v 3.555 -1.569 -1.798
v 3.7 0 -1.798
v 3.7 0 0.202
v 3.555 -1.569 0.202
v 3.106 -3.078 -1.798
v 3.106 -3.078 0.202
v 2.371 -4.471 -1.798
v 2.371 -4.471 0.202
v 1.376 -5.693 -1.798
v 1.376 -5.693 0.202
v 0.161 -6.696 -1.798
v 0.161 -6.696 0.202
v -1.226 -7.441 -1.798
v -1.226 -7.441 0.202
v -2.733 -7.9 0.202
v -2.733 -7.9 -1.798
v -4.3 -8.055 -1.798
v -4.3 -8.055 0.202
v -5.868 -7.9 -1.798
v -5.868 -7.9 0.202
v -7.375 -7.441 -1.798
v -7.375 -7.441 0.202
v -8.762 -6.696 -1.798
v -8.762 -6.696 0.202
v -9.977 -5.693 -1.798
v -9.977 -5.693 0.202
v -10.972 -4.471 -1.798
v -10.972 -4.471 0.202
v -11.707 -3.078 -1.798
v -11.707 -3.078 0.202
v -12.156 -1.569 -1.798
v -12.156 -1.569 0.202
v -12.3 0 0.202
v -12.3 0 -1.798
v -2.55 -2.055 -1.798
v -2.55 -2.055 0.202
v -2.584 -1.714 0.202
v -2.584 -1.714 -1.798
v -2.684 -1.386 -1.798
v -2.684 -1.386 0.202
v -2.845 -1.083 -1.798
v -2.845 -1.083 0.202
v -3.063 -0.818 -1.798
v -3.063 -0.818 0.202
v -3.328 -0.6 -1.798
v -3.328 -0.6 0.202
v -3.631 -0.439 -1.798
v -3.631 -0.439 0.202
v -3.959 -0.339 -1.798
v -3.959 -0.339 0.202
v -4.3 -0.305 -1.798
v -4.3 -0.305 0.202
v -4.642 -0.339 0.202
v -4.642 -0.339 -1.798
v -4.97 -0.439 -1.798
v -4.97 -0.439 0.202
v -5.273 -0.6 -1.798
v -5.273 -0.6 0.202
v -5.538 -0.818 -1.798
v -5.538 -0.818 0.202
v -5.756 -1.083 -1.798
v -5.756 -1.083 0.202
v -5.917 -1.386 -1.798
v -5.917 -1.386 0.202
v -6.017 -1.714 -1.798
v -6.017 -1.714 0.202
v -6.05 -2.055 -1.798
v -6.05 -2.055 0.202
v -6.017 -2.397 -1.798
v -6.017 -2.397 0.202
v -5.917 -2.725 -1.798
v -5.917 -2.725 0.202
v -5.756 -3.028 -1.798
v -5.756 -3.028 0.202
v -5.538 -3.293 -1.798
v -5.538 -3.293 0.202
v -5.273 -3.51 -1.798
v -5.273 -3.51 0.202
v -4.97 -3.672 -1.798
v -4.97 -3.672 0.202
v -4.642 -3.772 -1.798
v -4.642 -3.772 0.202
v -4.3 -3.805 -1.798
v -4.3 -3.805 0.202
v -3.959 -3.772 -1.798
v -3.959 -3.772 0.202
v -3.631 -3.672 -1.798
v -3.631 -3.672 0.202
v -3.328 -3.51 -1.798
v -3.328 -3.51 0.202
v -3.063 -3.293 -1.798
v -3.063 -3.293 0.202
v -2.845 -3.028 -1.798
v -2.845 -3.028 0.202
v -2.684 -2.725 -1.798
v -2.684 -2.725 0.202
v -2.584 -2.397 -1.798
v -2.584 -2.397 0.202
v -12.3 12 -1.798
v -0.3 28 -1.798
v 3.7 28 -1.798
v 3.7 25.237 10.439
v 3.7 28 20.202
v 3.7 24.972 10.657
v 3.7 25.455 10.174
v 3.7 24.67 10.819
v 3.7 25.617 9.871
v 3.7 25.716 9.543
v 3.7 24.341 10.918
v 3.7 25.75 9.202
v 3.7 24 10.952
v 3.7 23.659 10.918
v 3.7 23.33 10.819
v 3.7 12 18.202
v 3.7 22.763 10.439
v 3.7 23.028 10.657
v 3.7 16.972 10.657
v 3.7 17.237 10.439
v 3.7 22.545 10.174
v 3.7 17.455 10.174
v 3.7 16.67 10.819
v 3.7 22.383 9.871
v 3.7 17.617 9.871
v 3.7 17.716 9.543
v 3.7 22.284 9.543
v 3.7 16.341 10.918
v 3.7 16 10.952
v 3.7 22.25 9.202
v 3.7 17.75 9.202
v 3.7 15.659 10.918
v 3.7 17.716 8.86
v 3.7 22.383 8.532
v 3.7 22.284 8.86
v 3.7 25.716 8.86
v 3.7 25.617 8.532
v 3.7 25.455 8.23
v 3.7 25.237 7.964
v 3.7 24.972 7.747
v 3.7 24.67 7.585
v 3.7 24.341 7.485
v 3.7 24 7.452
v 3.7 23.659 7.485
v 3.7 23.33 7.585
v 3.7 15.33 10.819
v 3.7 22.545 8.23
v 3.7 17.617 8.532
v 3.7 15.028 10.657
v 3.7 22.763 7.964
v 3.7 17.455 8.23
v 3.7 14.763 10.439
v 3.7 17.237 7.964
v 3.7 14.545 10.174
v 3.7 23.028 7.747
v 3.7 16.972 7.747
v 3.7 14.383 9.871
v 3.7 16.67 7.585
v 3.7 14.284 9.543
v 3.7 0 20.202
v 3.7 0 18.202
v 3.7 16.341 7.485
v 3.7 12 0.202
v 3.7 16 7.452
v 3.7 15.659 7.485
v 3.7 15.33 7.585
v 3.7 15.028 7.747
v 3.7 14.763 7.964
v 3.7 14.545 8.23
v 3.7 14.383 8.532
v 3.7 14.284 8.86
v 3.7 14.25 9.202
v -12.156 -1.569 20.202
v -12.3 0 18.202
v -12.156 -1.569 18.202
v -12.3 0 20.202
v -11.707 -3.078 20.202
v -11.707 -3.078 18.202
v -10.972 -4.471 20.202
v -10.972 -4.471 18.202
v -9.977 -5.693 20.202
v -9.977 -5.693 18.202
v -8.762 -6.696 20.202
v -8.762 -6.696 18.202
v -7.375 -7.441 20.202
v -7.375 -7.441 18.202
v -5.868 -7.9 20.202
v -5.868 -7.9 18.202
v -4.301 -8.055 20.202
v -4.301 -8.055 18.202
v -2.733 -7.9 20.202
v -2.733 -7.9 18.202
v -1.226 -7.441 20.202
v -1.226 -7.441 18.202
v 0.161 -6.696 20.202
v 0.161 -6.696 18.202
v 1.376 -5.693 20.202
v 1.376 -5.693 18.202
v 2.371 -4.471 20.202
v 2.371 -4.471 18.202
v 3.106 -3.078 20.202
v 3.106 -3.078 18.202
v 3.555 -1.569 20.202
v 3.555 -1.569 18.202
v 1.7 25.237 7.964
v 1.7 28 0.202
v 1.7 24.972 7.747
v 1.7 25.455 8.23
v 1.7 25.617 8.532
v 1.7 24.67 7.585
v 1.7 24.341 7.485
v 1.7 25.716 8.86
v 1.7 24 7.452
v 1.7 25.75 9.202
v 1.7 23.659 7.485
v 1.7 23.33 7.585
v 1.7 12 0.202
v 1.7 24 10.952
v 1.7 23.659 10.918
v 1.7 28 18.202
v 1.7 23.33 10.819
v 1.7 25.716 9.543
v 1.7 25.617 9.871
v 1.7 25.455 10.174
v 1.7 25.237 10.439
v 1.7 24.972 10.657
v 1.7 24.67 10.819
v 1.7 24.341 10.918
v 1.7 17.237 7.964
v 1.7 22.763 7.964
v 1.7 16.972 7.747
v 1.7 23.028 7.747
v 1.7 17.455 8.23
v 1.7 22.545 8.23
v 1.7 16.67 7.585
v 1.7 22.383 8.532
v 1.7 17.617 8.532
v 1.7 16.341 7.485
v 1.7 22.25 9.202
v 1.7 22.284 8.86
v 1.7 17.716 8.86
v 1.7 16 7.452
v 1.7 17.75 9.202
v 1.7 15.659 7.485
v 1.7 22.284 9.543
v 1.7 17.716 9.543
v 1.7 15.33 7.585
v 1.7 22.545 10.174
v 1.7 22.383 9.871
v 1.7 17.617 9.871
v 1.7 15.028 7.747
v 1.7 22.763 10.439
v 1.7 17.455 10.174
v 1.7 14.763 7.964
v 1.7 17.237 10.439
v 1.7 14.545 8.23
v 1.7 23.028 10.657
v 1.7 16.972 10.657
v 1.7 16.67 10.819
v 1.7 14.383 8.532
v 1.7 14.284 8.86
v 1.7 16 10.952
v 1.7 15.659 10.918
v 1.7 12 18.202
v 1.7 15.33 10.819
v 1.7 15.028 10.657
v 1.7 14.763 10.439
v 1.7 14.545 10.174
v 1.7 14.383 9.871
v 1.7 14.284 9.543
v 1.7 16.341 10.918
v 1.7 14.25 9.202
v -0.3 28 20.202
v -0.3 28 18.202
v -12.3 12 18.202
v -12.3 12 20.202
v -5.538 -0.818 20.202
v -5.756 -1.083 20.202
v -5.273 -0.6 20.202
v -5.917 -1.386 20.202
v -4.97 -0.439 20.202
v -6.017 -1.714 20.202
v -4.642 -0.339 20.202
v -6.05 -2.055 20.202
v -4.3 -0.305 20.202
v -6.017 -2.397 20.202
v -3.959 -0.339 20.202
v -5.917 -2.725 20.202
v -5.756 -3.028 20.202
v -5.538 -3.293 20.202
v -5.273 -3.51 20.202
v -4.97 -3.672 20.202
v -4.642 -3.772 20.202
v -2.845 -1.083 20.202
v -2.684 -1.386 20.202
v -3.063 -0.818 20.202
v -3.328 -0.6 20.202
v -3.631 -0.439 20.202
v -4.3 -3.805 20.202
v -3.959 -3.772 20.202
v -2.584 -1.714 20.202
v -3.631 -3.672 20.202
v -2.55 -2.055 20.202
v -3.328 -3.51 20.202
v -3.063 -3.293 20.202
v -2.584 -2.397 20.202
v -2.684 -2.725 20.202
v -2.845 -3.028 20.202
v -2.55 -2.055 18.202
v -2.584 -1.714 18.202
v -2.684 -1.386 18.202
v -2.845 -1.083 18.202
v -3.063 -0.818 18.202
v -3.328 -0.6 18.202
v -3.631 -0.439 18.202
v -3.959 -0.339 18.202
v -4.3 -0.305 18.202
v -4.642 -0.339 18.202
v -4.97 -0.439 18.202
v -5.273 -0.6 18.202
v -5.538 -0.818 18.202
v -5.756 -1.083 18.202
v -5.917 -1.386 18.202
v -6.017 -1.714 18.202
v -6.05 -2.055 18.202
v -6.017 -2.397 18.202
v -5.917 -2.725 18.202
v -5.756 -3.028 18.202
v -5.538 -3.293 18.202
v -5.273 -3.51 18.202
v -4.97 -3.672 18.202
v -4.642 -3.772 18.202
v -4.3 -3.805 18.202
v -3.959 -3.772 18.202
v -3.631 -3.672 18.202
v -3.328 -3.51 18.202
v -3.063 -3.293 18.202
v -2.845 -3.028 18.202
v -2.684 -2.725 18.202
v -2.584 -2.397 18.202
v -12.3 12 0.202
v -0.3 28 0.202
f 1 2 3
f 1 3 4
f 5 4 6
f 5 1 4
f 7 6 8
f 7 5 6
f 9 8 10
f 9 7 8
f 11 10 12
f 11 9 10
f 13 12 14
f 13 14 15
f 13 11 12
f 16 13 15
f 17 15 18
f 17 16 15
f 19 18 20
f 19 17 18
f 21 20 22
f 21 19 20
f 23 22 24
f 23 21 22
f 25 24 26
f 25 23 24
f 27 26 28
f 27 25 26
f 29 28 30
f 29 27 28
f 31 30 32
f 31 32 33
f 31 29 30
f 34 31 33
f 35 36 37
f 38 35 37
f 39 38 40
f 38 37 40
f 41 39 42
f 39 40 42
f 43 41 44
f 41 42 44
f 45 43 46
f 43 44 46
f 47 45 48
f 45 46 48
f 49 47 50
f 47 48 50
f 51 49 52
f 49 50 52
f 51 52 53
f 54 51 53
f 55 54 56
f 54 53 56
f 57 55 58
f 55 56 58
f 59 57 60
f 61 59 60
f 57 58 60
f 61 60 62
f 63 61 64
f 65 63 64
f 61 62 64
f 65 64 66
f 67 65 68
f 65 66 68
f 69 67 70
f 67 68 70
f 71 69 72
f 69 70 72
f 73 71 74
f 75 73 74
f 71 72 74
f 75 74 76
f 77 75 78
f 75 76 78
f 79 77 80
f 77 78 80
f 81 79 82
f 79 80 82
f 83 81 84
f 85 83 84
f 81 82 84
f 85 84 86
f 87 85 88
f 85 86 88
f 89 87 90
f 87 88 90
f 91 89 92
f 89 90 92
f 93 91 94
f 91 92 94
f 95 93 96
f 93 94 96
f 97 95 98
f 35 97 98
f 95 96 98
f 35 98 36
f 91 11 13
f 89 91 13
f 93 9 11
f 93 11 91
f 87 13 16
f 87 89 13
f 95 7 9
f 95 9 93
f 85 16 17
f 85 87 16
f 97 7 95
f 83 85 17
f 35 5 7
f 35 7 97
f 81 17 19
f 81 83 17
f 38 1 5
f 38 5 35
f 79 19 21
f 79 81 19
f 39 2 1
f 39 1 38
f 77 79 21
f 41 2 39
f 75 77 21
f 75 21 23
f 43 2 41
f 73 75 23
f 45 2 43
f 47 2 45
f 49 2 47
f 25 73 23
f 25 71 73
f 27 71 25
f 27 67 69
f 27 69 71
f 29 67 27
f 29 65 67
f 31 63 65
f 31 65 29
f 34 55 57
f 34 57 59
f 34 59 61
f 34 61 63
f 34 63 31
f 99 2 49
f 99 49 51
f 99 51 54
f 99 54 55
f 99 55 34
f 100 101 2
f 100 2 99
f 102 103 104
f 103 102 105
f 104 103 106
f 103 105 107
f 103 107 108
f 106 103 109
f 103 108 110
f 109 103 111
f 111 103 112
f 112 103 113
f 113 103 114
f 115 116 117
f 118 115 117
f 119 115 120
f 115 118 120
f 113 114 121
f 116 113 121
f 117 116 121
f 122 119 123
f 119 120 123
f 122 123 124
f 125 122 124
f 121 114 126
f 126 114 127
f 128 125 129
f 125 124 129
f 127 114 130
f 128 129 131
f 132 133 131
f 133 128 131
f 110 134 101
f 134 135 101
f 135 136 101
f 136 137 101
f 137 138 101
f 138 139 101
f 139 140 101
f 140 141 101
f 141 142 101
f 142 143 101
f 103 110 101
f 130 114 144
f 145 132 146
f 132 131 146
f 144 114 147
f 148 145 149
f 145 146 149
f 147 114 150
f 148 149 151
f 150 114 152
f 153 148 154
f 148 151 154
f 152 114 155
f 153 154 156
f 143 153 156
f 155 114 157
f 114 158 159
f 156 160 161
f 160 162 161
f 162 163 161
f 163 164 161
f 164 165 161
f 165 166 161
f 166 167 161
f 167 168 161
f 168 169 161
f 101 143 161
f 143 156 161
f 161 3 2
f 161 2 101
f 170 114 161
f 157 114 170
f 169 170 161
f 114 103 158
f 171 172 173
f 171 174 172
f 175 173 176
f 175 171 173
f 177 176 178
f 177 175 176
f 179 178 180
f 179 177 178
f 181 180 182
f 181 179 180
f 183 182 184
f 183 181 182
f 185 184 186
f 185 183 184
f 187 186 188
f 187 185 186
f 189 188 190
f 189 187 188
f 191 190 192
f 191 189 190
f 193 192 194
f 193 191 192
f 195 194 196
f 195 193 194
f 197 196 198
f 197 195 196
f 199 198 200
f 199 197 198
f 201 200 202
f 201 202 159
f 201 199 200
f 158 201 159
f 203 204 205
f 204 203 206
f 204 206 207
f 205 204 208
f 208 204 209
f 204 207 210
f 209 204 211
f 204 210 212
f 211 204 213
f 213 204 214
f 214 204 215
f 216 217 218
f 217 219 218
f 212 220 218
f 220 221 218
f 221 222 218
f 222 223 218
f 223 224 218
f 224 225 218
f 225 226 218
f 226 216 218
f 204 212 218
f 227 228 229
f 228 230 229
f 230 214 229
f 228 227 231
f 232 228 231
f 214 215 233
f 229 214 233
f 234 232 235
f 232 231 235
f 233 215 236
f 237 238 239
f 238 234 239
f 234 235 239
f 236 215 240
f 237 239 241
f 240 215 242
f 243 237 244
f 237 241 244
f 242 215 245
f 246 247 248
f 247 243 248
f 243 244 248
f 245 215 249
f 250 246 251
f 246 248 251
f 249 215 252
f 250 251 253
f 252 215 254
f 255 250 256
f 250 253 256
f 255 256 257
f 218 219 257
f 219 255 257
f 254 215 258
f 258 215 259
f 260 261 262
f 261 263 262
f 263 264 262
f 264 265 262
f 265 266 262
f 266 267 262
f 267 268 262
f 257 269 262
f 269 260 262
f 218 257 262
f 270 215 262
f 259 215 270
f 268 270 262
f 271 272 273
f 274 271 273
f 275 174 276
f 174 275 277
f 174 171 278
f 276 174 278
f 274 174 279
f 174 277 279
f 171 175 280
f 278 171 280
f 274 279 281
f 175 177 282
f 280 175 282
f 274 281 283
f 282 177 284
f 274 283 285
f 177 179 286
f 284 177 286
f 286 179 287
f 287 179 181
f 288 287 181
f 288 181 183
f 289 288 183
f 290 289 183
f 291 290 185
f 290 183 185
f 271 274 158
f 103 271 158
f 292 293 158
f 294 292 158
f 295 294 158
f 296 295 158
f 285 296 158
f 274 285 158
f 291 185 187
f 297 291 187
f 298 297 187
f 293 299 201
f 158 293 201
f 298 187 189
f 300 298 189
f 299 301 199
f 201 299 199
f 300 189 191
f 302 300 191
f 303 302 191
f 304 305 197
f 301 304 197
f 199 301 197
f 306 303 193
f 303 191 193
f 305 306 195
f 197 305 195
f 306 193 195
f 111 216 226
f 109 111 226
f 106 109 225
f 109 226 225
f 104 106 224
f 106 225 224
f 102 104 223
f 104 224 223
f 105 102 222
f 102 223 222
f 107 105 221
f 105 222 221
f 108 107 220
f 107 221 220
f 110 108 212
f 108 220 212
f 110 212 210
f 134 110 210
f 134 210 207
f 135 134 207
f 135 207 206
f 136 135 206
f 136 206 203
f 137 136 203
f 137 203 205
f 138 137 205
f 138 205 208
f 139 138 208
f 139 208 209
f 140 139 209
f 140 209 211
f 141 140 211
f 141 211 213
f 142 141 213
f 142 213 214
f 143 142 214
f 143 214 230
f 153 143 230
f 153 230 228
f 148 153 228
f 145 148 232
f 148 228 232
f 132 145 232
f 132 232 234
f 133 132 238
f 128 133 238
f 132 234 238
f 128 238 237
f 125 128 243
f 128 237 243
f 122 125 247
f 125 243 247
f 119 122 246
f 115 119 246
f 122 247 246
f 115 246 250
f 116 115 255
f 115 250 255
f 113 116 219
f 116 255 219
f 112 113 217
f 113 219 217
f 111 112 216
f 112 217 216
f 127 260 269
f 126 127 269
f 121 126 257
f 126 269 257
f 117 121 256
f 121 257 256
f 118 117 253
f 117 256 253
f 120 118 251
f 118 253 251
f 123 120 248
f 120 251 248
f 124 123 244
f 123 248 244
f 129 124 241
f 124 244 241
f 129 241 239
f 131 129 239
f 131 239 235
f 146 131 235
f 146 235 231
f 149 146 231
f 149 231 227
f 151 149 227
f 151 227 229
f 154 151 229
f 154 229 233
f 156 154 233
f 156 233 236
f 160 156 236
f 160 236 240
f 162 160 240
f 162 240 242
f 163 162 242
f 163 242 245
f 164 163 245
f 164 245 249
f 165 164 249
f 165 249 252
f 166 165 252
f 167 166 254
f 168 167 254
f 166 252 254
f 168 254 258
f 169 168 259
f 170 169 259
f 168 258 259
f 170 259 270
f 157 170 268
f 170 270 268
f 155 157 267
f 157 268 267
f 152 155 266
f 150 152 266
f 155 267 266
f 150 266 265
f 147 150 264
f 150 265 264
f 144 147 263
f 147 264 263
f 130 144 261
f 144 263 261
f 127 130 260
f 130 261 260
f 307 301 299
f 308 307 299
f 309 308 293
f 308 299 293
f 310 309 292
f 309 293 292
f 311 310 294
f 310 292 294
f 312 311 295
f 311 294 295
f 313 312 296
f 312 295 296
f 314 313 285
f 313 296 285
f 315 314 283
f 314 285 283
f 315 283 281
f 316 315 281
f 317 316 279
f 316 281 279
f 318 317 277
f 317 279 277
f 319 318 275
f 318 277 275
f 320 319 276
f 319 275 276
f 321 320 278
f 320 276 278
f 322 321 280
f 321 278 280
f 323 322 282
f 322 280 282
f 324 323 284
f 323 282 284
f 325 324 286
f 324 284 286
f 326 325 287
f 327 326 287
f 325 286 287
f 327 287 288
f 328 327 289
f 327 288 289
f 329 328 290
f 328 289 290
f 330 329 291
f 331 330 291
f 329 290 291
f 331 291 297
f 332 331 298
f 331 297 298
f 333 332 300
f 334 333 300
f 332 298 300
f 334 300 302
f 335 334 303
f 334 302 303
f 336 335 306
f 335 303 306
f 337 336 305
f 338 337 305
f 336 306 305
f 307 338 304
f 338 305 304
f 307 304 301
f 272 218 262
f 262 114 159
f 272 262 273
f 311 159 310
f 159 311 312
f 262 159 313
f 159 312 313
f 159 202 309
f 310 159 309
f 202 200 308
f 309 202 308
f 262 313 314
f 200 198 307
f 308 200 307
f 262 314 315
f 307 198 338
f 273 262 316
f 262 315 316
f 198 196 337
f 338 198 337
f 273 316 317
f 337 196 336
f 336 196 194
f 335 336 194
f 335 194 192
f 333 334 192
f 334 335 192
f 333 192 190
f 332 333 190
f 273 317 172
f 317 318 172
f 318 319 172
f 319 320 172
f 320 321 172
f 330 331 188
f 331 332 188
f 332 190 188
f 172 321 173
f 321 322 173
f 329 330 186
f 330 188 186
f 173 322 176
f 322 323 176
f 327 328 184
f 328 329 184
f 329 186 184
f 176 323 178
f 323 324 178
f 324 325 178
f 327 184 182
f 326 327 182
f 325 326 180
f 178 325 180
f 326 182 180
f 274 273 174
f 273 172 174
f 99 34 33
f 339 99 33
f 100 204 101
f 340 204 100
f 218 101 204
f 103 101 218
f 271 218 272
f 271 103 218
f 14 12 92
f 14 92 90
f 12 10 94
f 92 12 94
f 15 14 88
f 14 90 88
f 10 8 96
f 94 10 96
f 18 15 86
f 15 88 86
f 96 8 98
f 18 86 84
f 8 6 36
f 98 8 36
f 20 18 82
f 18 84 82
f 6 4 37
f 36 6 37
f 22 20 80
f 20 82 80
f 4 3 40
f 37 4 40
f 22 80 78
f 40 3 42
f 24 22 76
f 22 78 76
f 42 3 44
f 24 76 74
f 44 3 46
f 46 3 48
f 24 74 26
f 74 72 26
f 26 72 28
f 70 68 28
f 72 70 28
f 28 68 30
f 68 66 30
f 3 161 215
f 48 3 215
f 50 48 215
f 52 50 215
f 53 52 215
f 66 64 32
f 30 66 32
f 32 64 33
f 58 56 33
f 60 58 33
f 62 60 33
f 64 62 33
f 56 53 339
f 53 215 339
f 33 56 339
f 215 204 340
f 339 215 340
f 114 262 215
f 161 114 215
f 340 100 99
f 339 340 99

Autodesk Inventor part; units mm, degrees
ref_plane "YZ Plane" through (0, 0, 0) normal (1, 0, 0) x (0, 1, 0)
ref_plane "XZ Plane" through (0, 0, 0) normal (0, 1, 0) x (-1, 0, 0)
ref_plane "XY Plane" through (0, 0, 0) normal (0, 0, 1) x (1, 0, 0)
sketch "Boceto1" plane through (0, 0, 0) normal (0, 1, 0) x (-1, 0, 0)
  line L0 (10.3005, 0.2018) -> (-1.6995, 0.2018)
  line L1 (-1.6995, 0.2018) -> (-1.6995, 18.2018)
  line L2 (-1.6995, 18.2018) -> (10.3005, 18.2018)
  line L3 (12.3005, 20.2018) -> (-3.6995, 20.2018)
  line L4 (-3.6995, 20.2018) -> (-3.6995, -1.7982)
  line L5 (-3.6995, -1.7982) -> (12.3005, -1.7982)
  line L6 (10.3005, 18.2018) -> (12.3005, 18.2018)
  line L7 (10.3005, 0.2018) -> (12.3005, 0.2018)
  line L8 (12.3005, -1.7982) -> (12.3005, 0.2018)
  line L9 (12.3005, 18.2018) -> (12.3005, 20.2018)
  point P0 (0, 0)
  point P1 (0, 0)
  dimension "d0" = 18
  dimension "d1" = 12
extrude "Extrusión1" add sketch "Boceto1" along normal blind 28
sketch "Boceto4" plane through (1.6995, 0, 0.2018) normal (-1, 0, 0) x (0, 0, 1)
  line L0 (18, 0) -> (18, 28) projected
  line L1 (18, 28) -> (18, 12)
  line L2 (18, 12) -> (0, 12)
  line L3 (0, 0) -> (0, 28) projected
  line L4 (18, 28) -> (0, 28)
  line L5 (0, 28) -> (0, 12)
  line L6 (20, 28) -> (-2, 28) projected
  line L7 (9, 28) -> (9, 12)
  circle A0 centre (9, 24) radius 1.75
  circle A1 centre (9, 16) radius 1.75
  line L8 (18, 12) -> (18, 0)
  line L9 (0, 0) -> (18, 0) projected
  line L10 (0, 0) -> (0, 12)
  line L11 (18, 0) -> (0, 0)
  point P0 (-0.2018, 0)
  dimension "d14" = 16
  dimension "d15" = 3.5
  dimension "d16" = 3.5
  dimension "d17" = 4
  dimension "d18" = 4
extrude "Extrusión4" cut sketch "Boceto4" against normal blind 2 contours L9 L3 L2 L0 | A1 L7 | L7 A1 | A0 L7 | L7 A0
sketch "Boceto5" plane through (3.6995, 28, -1.7982) normal (0, 0, -1) x (-1, 0, 0)
  line L0 (0, -28) -> (0, 0) projected
  line L1 (0, 0) -> (4, 0)
  line L2 (16, 0) -> (0, 0) projected
  line L3 (0, 0) -> (0, -16)
  line L4 (0, -16) -> (16, -16)
  line L5 (16, -28) -> (16, 0) projected
  line L6 (4, 0) -> (16, -16)
  line L7 (4, 0) -> (4, -16)
  point P0 (3.6995, -28)
  point P1 (0, -26.5)
  point P2 (16, -26.5)
  dimension "d21" = 4
  dimension "d22" = 16
extrude "Extrusión5" cut sketch "Boceto5" against normal blind 30 contours L2 L5 L6
sketch "Boceto6" plane through (3.6995, 0, -1.7982) normal (0, 0, -1) x (-1, 0, 0)
  line L0 (0, 12) -> (0, 0) projected
  line L1 (16, 0) -> (16, 12) projected
  arc A0 (0, 0) -> (16, 0) centre (8, -0.0553) ccw
  line L2 (16, 0) -> (0, 0) projected
  line L3 (16, 0) -> (0, 0)
  point P0 (3.6995, 0)
sketch "Boceto7" plane through (-12.3005, 0, 20.2018) normal (0, 0, 1) x (1, 0, 0)
  line L0 (0, 12) -> (0, 0)
  line L1 (16, 0) -> (16, 12)
  arc A0 (0, 0) -> (16, 0) centre (8, -0.0553) ccw
  line L2 (0, 0) -> (16, 0) projected
  line L3 (0, 0) -> (16, 0)
  circle A1 centre (8, -2.0553) radius 1.75
  point P0 (12.3005, 0)
  point P1 (3.6995, 0)
  dimension "d30" = 3.5
  dimension "d31" = 2
extrude "Extrusión6" add sketch "Boceto7" against normal blind 2 contours L2 A0 | A1
extrude "Extrusión7" add sketch "Boceto6" against normal blind 2
extrude "Extrusión8" cut sketch "Boceto7" against normal blind 30 contours A1
properties part number "Kit de Sujeción 2"
